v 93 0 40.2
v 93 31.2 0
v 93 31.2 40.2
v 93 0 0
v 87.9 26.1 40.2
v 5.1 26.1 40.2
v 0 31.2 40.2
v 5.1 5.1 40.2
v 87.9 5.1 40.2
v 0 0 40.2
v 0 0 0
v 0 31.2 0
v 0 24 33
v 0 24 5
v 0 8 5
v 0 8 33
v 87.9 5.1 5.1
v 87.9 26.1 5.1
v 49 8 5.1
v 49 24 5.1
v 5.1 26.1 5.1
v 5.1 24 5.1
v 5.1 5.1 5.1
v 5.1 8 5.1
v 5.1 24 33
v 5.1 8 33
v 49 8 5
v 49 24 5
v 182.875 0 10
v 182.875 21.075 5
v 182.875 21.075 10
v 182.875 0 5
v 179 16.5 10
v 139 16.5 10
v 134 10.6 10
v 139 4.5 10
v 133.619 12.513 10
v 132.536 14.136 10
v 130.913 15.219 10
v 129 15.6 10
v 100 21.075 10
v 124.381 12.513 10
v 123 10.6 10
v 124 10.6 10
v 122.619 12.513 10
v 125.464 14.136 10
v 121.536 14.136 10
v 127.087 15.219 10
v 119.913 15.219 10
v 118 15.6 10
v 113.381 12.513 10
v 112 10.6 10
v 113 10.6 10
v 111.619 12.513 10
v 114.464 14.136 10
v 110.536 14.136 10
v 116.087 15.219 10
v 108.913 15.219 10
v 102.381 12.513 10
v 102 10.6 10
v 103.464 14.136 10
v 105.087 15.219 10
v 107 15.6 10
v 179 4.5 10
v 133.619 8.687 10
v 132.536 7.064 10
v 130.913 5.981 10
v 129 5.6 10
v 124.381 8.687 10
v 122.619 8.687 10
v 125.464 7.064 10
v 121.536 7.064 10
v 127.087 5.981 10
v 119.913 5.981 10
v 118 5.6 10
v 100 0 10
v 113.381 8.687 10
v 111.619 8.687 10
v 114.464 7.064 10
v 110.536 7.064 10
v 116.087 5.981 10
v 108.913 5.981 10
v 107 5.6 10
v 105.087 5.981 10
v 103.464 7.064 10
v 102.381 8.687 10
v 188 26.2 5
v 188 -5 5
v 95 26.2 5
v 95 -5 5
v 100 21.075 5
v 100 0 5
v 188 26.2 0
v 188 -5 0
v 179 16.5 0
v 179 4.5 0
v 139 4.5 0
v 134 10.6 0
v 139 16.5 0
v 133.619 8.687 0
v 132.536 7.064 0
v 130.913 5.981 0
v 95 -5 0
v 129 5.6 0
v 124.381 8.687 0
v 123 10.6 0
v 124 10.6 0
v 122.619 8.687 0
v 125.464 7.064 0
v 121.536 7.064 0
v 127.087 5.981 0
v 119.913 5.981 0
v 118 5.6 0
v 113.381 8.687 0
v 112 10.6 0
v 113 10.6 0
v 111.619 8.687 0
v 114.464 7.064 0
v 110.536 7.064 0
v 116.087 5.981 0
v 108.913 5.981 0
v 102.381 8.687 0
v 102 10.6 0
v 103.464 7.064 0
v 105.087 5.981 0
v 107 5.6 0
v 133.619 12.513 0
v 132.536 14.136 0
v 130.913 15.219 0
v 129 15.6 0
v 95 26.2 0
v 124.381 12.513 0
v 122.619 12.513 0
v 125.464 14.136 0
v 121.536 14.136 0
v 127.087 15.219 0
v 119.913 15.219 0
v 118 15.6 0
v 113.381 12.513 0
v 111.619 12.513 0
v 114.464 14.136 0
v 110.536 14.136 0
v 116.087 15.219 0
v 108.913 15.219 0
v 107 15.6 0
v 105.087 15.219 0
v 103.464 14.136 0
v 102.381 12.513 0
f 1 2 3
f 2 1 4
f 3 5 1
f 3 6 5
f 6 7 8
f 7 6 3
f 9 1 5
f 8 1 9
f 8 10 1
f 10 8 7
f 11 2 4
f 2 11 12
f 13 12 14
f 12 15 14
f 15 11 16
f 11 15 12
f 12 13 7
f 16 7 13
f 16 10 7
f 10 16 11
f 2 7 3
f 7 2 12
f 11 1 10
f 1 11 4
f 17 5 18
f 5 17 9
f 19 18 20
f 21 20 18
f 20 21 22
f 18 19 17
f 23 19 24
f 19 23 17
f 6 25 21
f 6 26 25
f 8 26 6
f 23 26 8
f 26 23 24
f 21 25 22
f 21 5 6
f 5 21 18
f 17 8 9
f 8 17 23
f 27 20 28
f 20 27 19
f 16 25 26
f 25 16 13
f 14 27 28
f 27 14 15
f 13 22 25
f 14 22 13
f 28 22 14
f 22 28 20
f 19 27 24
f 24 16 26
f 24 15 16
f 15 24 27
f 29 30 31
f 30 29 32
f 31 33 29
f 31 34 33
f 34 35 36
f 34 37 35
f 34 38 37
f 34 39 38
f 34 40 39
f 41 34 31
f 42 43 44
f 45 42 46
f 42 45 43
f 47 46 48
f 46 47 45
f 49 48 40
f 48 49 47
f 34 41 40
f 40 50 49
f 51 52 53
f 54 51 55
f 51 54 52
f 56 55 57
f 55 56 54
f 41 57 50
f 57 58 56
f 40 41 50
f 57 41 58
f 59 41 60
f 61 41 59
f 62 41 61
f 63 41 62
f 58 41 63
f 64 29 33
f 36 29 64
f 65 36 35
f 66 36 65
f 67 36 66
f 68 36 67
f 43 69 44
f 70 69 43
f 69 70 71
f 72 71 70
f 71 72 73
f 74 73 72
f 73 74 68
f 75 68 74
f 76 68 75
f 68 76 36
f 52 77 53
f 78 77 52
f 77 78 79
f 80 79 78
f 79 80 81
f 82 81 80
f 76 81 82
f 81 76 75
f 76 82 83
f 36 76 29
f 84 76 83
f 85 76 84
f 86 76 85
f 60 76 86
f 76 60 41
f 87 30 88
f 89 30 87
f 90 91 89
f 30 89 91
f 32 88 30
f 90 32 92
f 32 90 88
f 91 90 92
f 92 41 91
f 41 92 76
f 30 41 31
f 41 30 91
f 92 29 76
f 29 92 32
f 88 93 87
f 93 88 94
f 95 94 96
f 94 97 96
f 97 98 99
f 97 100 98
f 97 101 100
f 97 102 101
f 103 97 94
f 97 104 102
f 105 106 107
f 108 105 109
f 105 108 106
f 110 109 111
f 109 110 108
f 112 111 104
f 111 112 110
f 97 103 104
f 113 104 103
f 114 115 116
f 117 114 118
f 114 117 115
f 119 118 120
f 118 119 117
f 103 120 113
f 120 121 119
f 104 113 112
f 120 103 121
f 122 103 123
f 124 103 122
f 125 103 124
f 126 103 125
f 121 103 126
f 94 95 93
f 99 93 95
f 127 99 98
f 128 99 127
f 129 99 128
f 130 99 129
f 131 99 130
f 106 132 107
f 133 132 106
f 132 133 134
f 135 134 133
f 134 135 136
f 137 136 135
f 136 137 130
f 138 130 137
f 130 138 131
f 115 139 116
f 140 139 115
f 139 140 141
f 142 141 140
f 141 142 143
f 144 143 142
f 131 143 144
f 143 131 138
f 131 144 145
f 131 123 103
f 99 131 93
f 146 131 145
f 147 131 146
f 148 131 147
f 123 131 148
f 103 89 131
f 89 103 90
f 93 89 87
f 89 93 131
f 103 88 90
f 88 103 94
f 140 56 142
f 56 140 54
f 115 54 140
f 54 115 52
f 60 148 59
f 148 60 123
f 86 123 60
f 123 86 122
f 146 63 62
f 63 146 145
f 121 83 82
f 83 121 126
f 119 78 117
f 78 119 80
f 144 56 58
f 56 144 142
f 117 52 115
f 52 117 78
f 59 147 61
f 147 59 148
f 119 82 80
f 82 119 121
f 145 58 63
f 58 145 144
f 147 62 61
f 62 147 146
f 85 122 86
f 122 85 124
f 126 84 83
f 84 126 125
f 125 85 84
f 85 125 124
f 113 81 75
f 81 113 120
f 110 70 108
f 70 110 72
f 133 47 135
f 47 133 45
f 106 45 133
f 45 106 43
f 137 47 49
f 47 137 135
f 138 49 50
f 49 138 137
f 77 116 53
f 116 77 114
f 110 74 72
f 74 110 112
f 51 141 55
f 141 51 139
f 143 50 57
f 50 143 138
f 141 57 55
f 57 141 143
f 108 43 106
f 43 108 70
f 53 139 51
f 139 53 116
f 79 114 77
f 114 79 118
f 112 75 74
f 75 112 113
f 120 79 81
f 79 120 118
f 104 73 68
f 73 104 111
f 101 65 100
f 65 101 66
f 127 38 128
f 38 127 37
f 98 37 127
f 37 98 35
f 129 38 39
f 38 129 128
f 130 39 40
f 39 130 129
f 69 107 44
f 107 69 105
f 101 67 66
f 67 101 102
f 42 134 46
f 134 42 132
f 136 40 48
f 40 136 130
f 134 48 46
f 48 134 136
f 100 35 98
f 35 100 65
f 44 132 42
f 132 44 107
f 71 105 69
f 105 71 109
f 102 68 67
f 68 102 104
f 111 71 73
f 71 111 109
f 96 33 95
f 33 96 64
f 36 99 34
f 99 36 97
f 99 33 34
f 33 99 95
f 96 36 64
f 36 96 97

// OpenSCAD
width = 72.8 + 10 /* width margin */;
depth = 21;
height = 30;
inner_margin = 0.1;
walls_thick = 5;
lid_thick = walls_thick;
led_dia = 10;
display_width = 40;
display_depth = 12;
ethernet_depth = 16;
ethernet_height = 28;
difference() {
	cube([ width + inner_margin * 2 + walls_thick * 2, depth + inner_margin * 2 + walls_thick * 2, height + inner_margin * 2 + walls_thick * 2]);
    // inner
	translate([walls_thick + inner_margin, walls_thick + inner_margin, walls_thick + inner_margin])
		cube([ width, depth, height + 100]);
    // Ethernet connector
    translate([-1, depth / 2 - walls_thick / 2, walls_thick]) cube([50, ethernet_depth, ethernet_height]);
}


translate([100, 0, lid_thick])
difference() {
    union() {
        cube([width + inner_margin * 0.75, depth + inner_margin * 0.75, lid_thick]);
        translate([-walls_thick, -walls_thick, -lid_thick]) cube([width + inner_margin * 2 + walls_thick * 2, depth + inner_margin * 2 + walls_thick * 2, lid_thick]);
    };
   

   // leds
   translate([walls_thick + 2, depth / 2 + inner_margin, 0])
   union() {
       translate([0, 0, 0]) cylinder(d = led_dia, h=100, center = true);
       translate([1 * led_dia + 1, 0, 0]) cylinder(d = led_dia, h=100, center = true);
       translate([2 * led_dia + 2, 0, 0]) cylinder(d = led_dia, h=100, center = true);
   }
   
   // display
   translate([walls_thick + 3 * led_dia + 4
   , depth / 2 - display_depth / 2, -walls_thick * 2])
   union() {
        cube([display_width, display_depth, 100]);
   }
}
